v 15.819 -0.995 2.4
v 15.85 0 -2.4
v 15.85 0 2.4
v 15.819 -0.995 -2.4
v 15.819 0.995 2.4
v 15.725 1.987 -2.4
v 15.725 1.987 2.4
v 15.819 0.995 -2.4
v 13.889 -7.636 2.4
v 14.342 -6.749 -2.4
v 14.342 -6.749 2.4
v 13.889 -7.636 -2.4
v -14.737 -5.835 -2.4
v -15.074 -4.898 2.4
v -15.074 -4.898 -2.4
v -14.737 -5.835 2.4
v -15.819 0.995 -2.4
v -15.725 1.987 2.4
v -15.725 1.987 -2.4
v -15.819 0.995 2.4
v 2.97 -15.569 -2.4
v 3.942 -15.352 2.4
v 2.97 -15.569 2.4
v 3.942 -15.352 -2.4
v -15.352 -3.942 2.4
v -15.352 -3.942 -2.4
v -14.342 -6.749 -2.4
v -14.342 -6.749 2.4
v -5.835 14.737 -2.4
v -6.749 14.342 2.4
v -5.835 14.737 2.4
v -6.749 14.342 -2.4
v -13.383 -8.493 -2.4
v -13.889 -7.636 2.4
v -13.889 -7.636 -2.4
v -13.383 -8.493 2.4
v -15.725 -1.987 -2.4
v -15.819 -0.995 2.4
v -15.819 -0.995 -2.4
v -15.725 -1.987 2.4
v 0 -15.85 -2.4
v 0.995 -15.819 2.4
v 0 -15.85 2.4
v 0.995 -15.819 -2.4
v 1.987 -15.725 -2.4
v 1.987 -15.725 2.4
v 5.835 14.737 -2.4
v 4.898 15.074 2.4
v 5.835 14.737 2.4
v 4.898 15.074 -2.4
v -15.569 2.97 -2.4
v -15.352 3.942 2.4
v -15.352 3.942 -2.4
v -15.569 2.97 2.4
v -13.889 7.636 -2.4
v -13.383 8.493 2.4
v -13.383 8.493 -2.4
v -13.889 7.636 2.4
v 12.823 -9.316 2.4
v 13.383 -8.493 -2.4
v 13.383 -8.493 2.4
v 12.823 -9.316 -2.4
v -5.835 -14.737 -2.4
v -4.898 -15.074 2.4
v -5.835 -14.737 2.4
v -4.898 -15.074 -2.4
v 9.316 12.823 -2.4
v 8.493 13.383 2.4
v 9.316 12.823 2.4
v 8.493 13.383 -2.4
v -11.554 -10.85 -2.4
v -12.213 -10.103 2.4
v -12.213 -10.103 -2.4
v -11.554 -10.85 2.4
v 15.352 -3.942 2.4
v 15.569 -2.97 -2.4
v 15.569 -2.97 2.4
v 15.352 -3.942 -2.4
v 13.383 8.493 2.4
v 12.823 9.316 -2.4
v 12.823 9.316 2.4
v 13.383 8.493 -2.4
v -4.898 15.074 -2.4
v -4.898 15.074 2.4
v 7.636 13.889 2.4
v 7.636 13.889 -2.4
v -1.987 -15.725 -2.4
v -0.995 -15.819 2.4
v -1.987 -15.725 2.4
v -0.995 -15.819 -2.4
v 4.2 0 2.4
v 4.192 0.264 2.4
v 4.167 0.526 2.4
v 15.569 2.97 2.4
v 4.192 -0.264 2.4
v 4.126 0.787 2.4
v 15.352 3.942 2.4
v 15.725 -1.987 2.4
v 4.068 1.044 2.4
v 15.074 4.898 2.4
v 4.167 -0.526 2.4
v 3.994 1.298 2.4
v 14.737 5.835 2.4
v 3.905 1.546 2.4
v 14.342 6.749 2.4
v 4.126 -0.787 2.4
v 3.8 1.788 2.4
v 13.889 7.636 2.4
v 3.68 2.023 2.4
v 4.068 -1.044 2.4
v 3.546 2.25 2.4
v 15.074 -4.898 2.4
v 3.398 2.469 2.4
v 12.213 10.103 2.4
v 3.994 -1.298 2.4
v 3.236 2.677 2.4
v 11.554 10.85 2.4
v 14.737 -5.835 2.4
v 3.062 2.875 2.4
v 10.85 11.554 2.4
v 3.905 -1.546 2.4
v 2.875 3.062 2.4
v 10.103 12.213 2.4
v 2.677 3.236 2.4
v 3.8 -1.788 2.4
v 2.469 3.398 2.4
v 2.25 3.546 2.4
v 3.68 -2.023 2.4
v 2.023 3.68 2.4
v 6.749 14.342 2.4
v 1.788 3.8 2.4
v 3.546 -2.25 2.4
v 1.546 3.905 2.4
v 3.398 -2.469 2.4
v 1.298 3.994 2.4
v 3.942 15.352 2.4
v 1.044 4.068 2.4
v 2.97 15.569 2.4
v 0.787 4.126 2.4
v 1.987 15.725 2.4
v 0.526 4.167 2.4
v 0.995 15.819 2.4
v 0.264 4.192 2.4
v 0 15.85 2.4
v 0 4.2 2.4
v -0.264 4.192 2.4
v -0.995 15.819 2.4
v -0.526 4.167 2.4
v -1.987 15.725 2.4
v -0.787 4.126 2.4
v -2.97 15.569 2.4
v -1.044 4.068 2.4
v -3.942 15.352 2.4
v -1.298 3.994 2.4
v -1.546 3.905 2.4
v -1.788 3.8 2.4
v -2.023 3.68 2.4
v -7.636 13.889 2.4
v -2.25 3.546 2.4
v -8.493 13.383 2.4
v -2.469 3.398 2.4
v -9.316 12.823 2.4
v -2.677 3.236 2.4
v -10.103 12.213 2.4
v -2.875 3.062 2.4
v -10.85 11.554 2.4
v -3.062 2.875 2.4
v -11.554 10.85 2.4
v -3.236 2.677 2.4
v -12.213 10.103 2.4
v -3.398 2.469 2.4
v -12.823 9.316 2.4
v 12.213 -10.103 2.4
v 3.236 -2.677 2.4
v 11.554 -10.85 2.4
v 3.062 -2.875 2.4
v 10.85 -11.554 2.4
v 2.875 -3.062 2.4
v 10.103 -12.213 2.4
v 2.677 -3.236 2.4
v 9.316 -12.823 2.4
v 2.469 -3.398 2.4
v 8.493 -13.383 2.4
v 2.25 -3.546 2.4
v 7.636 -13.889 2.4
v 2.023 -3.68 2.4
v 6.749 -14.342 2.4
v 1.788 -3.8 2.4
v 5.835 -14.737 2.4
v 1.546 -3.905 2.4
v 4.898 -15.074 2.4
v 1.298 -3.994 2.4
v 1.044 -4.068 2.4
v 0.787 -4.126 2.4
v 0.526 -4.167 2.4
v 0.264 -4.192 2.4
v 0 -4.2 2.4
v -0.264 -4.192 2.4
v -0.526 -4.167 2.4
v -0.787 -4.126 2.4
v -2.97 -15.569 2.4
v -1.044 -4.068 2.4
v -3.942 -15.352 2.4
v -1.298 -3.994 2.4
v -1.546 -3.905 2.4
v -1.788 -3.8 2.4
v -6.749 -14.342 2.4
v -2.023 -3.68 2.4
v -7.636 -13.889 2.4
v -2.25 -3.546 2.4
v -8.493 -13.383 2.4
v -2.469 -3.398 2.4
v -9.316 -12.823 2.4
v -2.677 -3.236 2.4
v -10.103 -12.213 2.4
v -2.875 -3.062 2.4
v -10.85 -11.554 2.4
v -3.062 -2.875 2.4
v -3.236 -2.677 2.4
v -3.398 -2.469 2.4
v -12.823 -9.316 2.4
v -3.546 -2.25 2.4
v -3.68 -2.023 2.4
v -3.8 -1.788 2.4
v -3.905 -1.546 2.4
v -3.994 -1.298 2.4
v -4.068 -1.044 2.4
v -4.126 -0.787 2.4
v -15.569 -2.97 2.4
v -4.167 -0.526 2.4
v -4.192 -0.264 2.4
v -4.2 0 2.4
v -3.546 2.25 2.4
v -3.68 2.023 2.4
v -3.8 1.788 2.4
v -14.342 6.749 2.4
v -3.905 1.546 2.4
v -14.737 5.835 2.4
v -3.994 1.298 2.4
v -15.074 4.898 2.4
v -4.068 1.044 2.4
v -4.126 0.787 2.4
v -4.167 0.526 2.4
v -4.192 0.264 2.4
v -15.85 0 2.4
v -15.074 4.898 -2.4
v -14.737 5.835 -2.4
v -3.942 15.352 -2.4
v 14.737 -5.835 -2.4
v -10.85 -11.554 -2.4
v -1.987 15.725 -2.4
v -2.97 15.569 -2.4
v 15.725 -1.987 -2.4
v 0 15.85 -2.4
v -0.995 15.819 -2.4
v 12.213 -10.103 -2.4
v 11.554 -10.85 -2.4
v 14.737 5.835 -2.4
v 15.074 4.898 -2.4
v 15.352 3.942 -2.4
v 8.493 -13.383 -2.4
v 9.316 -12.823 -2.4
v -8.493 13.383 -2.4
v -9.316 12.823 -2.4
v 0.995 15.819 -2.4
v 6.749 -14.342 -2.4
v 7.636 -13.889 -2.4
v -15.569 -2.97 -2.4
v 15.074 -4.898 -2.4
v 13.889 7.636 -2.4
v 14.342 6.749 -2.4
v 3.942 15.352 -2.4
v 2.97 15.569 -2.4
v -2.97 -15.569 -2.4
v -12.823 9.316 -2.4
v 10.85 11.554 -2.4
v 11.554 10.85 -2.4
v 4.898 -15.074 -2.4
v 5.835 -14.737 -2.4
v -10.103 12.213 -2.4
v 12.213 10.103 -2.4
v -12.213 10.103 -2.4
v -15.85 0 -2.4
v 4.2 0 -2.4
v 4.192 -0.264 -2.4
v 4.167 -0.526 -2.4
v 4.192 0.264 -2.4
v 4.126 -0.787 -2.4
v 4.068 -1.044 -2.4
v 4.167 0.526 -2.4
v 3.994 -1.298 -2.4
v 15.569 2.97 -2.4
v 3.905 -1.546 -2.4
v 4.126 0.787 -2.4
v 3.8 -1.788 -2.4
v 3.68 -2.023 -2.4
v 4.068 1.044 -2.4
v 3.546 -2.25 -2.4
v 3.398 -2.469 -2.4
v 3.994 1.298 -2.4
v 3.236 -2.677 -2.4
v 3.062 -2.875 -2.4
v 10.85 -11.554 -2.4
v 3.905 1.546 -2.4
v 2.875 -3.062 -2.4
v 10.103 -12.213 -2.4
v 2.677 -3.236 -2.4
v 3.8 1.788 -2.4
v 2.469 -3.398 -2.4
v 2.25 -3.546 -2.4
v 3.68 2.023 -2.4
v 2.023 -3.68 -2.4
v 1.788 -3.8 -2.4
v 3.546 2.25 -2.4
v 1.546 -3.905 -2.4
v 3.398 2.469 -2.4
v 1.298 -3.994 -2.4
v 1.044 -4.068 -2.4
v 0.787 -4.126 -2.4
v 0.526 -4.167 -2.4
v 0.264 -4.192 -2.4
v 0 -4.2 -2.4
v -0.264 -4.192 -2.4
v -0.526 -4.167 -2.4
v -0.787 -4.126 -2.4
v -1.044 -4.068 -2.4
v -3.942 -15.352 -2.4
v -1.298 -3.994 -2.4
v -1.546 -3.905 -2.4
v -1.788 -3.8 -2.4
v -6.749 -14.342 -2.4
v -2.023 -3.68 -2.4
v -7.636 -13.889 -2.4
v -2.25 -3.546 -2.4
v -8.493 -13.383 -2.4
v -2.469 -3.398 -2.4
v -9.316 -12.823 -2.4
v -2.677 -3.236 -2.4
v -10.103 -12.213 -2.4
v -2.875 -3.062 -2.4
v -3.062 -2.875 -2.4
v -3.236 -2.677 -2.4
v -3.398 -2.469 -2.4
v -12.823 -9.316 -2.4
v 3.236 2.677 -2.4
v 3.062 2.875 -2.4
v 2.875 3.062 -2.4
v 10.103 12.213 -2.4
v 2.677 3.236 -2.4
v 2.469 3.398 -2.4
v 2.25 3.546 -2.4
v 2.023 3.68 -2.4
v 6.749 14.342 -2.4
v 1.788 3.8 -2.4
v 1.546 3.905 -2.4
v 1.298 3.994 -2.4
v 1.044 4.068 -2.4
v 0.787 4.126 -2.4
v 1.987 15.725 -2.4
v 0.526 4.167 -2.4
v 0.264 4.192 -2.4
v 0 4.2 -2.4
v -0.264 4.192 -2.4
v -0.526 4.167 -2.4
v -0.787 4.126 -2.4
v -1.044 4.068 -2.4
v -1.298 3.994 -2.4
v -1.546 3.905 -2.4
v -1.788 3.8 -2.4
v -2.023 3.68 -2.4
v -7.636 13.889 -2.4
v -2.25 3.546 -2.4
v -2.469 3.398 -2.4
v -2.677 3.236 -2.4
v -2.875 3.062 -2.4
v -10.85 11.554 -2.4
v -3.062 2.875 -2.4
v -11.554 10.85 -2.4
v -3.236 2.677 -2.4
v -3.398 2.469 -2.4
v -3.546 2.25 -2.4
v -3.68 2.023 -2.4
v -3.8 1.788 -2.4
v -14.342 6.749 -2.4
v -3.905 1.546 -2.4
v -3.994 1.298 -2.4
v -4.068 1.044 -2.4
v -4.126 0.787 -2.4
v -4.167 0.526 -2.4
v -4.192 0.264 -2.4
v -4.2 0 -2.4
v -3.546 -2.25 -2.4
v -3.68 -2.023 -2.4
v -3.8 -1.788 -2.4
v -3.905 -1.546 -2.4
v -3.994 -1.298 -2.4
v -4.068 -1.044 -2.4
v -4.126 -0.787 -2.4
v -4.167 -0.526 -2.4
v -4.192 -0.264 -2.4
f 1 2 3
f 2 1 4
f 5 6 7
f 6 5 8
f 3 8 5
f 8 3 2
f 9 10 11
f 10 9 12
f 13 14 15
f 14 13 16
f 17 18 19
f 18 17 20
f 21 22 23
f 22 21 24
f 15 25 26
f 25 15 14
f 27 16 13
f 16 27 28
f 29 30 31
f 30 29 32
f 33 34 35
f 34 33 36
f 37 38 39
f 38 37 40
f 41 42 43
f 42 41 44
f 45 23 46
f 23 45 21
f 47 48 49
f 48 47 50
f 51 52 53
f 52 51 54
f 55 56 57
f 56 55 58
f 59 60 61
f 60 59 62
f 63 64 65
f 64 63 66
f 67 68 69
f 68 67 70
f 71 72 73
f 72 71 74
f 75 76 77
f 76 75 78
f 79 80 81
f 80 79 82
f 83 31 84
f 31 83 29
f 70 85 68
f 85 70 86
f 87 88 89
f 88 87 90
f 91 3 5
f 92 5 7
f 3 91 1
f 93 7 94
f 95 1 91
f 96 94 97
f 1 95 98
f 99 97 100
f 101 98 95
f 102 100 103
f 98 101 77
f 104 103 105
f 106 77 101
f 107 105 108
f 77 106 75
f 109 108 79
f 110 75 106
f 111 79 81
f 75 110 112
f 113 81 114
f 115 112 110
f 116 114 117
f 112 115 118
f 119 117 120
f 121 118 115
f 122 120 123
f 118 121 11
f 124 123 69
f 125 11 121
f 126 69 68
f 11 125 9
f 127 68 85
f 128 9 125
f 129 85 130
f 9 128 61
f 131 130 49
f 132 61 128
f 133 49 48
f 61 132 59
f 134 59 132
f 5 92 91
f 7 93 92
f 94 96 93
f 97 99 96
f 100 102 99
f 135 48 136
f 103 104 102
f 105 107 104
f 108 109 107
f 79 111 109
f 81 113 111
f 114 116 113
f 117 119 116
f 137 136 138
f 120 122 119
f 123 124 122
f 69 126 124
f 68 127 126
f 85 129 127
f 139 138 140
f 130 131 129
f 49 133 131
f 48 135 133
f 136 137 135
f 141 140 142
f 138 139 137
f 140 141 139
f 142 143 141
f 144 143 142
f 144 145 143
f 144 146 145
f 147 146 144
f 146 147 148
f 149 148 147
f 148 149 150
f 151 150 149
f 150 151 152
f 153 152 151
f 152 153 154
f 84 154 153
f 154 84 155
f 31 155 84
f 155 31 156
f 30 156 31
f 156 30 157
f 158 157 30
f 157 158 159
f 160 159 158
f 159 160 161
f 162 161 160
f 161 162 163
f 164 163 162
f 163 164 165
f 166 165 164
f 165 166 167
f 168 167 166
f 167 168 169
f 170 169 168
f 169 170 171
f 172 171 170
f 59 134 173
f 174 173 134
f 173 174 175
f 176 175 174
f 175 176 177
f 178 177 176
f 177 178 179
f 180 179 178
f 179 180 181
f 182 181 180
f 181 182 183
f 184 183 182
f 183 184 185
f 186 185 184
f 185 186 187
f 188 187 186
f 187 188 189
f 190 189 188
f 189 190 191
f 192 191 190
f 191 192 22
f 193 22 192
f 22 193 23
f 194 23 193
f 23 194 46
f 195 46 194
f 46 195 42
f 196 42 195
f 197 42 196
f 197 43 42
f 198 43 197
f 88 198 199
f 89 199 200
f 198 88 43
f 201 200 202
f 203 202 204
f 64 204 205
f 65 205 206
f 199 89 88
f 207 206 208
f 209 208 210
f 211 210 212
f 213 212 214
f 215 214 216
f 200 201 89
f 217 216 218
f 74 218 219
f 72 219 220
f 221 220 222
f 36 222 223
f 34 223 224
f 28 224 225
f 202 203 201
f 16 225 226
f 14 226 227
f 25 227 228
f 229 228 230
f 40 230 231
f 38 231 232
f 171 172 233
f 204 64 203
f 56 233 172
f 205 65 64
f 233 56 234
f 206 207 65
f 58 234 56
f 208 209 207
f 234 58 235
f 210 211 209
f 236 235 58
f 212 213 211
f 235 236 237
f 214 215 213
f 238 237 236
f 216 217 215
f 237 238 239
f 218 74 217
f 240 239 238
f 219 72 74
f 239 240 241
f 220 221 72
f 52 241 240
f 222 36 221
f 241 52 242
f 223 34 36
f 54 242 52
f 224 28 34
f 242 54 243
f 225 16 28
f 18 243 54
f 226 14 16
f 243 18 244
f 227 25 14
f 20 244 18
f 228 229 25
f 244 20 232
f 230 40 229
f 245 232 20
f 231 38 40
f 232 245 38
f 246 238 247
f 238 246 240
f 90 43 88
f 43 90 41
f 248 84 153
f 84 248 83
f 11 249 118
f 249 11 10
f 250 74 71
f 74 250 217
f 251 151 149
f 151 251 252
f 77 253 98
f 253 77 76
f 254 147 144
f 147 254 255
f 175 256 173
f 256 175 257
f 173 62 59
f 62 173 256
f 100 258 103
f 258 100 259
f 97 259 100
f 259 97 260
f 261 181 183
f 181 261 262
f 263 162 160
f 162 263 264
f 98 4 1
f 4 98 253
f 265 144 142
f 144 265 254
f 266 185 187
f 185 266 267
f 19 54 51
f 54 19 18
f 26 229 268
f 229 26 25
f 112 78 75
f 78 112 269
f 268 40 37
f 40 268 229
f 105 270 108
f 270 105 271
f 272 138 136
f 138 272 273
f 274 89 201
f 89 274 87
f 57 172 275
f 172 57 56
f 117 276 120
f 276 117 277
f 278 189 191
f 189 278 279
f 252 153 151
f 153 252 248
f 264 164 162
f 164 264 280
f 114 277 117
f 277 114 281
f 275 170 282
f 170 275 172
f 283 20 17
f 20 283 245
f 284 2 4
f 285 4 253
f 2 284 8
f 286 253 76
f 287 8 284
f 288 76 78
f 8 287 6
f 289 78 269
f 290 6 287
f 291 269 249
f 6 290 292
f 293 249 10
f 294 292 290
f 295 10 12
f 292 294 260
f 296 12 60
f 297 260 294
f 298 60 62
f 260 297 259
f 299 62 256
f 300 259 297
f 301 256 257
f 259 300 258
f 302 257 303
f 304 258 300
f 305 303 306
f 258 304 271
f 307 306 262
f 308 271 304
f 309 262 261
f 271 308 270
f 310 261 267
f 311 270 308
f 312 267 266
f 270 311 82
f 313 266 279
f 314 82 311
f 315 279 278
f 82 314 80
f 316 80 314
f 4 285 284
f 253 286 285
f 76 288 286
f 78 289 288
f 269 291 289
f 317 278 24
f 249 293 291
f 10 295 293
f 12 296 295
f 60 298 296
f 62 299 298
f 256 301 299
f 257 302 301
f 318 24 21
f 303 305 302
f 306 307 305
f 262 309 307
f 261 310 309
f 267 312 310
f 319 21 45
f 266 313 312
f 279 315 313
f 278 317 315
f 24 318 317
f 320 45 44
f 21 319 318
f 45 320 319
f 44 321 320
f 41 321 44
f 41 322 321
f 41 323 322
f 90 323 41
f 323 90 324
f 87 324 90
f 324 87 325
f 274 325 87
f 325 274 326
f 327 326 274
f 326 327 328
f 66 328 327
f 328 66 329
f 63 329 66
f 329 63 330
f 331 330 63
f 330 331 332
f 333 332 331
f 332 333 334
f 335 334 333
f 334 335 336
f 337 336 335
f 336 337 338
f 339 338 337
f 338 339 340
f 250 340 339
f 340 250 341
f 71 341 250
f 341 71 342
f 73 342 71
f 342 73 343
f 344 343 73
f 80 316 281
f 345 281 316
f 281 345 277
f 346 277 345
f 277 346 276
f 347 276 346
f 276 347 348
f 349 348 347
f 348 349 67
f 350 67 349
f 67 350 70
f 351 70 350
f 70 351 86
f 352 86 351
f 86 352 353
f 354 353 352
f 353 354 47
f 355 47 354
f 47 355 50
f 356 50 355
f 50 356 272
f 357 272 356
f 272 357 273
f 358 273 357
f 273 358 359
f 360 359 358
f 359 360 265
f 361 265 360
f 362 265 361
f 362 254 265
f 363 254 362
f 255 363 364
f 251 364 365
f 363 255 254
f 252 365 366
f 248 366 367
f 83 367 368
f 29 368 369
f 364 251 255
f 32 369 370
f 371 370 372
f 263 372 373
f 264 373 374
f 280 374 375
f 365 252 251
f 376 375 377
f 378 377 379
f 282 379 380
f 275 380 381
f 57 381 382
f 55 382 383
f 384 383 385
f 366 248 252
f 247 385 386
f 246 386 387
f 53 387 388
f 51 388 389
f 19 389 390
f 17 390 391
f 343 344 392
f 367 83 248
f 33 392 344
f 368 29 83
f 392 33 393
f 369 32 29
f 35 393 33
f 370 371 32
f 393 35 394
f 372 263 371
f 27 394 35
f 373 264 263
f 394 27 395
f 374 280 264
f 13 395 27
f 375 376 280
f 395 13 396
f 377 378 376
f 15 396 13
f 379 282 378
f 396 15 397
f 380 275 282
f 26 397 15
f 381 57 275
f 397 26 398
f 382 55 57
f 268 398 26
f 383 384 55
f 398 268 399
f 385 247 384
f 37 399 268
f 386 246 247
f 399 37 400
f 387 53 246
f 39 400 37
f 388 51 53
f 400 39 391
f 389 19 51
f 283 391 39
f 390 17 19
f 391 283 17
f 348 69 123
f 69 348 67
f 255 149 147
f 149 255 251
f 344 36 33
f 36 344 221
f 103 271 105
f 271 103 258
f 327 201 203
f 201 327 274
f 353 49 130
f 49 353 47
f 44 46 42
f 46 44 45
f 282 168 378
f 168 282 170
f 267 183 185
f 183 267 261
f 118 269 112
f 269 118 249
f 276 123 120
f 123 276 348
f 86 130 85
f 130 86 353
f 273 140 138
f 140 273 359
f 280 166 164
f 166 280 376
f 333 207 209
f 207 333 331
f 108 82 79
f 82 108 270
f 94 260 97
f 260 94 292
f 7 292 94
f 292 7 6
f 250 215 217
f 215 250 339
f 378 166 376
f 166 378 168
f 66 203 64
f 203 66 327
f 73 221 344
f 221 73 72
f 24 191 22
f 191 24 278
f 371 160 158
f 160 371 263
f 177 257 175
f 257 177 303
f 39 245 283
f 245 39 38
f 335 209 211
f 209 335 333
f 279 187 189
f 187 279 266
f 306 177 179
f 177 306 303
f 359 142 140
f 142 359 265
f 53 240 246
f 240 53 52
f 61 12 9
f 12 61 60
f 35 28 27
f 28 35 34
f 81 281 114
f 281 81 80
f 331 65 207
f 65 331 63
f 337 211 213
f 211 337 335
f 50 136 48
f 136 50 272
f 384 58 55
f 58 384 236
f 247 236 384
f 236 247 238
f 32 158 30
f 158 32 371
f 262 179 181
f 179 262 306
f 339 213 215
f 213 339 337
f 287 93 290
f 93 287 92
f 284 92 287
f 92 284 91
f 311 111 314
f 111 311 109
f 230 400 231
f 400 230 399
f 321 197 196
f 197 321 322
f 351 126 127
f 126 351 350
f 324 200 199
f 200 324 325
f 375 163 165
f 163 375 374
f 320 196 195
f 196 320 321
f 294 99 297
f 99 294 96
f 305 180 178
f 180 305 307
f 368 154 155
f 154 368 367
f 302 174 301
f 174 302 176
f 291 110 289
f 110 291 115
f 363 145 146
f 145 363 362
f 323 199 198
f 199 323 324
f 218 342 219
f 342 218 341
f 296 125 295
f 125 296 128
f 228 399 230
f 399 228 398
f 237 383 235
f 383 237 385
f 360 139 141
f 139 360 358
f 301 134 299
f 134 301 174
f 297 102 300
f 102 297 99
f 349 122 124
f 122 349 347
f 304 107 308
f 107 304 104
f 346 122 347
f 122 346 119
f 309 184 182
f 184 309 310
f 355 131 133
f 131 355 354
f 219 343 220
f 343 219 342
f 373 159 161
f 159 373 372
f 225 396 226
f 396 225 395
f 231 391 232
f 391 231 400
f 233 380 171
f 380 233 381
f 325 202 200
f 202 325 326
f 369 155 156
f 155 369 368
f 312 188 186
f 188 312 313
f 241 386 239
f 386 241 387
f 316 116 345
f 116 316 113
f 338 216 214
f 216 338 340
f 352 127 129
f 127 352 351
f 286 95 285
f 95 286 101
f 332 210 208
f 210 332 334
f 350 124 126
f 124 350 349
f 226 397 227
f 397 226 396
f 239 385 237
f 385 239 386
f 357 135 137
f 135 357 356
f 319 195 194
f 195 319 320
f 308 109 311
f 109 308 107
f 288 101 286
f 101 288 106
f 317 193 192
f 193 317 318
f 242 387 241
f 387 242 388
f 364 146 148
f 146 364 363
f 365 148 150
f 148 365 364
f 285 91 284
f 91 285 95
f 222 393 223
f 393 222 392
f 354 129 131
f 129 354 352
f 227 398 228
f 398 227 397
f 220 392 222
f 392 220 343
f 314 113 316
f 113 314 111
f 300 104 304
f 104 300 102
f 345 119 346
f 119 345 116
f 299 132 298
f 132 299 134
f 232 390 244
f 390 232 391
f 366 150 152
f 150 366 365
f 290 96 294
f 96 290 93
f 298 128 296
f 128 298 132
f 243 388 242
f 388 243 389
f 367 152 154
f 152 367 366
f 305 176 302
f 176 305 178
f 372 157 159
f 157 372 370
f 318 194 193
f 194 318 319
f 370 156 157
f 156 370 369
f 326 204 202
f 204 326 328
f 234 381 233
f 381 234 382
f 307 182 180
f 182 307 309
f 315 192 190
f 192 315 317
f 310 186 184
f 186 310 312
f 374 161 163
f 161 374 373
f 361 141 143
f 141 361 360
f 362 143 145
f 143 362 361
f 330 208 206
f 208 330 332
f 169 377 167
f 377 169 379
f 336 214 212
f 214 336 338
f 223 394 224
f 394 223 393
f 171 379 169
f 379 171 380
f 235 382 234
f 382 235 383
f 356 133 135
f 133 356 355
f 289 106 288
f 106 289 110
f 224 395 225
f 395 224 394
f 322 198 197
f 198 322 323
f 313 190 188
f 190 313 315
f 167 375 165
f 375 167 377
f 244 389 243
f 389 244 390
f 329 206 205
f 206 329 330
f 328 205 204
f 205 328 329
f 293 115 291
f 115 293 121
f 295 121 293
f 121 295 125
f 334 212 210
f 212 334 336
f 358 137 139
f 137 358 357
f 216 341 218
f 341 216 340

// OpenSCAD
edge = 17.7/2+7;
edge2 = 8.4/2;

h = 4.8;

difference() {
cylinder(
r = edge,
h = h,
center = true,
$fn = 100);

cylinder(
r = edge2,
h = 2*h,
center = true,
$fn = 100);
    
}
